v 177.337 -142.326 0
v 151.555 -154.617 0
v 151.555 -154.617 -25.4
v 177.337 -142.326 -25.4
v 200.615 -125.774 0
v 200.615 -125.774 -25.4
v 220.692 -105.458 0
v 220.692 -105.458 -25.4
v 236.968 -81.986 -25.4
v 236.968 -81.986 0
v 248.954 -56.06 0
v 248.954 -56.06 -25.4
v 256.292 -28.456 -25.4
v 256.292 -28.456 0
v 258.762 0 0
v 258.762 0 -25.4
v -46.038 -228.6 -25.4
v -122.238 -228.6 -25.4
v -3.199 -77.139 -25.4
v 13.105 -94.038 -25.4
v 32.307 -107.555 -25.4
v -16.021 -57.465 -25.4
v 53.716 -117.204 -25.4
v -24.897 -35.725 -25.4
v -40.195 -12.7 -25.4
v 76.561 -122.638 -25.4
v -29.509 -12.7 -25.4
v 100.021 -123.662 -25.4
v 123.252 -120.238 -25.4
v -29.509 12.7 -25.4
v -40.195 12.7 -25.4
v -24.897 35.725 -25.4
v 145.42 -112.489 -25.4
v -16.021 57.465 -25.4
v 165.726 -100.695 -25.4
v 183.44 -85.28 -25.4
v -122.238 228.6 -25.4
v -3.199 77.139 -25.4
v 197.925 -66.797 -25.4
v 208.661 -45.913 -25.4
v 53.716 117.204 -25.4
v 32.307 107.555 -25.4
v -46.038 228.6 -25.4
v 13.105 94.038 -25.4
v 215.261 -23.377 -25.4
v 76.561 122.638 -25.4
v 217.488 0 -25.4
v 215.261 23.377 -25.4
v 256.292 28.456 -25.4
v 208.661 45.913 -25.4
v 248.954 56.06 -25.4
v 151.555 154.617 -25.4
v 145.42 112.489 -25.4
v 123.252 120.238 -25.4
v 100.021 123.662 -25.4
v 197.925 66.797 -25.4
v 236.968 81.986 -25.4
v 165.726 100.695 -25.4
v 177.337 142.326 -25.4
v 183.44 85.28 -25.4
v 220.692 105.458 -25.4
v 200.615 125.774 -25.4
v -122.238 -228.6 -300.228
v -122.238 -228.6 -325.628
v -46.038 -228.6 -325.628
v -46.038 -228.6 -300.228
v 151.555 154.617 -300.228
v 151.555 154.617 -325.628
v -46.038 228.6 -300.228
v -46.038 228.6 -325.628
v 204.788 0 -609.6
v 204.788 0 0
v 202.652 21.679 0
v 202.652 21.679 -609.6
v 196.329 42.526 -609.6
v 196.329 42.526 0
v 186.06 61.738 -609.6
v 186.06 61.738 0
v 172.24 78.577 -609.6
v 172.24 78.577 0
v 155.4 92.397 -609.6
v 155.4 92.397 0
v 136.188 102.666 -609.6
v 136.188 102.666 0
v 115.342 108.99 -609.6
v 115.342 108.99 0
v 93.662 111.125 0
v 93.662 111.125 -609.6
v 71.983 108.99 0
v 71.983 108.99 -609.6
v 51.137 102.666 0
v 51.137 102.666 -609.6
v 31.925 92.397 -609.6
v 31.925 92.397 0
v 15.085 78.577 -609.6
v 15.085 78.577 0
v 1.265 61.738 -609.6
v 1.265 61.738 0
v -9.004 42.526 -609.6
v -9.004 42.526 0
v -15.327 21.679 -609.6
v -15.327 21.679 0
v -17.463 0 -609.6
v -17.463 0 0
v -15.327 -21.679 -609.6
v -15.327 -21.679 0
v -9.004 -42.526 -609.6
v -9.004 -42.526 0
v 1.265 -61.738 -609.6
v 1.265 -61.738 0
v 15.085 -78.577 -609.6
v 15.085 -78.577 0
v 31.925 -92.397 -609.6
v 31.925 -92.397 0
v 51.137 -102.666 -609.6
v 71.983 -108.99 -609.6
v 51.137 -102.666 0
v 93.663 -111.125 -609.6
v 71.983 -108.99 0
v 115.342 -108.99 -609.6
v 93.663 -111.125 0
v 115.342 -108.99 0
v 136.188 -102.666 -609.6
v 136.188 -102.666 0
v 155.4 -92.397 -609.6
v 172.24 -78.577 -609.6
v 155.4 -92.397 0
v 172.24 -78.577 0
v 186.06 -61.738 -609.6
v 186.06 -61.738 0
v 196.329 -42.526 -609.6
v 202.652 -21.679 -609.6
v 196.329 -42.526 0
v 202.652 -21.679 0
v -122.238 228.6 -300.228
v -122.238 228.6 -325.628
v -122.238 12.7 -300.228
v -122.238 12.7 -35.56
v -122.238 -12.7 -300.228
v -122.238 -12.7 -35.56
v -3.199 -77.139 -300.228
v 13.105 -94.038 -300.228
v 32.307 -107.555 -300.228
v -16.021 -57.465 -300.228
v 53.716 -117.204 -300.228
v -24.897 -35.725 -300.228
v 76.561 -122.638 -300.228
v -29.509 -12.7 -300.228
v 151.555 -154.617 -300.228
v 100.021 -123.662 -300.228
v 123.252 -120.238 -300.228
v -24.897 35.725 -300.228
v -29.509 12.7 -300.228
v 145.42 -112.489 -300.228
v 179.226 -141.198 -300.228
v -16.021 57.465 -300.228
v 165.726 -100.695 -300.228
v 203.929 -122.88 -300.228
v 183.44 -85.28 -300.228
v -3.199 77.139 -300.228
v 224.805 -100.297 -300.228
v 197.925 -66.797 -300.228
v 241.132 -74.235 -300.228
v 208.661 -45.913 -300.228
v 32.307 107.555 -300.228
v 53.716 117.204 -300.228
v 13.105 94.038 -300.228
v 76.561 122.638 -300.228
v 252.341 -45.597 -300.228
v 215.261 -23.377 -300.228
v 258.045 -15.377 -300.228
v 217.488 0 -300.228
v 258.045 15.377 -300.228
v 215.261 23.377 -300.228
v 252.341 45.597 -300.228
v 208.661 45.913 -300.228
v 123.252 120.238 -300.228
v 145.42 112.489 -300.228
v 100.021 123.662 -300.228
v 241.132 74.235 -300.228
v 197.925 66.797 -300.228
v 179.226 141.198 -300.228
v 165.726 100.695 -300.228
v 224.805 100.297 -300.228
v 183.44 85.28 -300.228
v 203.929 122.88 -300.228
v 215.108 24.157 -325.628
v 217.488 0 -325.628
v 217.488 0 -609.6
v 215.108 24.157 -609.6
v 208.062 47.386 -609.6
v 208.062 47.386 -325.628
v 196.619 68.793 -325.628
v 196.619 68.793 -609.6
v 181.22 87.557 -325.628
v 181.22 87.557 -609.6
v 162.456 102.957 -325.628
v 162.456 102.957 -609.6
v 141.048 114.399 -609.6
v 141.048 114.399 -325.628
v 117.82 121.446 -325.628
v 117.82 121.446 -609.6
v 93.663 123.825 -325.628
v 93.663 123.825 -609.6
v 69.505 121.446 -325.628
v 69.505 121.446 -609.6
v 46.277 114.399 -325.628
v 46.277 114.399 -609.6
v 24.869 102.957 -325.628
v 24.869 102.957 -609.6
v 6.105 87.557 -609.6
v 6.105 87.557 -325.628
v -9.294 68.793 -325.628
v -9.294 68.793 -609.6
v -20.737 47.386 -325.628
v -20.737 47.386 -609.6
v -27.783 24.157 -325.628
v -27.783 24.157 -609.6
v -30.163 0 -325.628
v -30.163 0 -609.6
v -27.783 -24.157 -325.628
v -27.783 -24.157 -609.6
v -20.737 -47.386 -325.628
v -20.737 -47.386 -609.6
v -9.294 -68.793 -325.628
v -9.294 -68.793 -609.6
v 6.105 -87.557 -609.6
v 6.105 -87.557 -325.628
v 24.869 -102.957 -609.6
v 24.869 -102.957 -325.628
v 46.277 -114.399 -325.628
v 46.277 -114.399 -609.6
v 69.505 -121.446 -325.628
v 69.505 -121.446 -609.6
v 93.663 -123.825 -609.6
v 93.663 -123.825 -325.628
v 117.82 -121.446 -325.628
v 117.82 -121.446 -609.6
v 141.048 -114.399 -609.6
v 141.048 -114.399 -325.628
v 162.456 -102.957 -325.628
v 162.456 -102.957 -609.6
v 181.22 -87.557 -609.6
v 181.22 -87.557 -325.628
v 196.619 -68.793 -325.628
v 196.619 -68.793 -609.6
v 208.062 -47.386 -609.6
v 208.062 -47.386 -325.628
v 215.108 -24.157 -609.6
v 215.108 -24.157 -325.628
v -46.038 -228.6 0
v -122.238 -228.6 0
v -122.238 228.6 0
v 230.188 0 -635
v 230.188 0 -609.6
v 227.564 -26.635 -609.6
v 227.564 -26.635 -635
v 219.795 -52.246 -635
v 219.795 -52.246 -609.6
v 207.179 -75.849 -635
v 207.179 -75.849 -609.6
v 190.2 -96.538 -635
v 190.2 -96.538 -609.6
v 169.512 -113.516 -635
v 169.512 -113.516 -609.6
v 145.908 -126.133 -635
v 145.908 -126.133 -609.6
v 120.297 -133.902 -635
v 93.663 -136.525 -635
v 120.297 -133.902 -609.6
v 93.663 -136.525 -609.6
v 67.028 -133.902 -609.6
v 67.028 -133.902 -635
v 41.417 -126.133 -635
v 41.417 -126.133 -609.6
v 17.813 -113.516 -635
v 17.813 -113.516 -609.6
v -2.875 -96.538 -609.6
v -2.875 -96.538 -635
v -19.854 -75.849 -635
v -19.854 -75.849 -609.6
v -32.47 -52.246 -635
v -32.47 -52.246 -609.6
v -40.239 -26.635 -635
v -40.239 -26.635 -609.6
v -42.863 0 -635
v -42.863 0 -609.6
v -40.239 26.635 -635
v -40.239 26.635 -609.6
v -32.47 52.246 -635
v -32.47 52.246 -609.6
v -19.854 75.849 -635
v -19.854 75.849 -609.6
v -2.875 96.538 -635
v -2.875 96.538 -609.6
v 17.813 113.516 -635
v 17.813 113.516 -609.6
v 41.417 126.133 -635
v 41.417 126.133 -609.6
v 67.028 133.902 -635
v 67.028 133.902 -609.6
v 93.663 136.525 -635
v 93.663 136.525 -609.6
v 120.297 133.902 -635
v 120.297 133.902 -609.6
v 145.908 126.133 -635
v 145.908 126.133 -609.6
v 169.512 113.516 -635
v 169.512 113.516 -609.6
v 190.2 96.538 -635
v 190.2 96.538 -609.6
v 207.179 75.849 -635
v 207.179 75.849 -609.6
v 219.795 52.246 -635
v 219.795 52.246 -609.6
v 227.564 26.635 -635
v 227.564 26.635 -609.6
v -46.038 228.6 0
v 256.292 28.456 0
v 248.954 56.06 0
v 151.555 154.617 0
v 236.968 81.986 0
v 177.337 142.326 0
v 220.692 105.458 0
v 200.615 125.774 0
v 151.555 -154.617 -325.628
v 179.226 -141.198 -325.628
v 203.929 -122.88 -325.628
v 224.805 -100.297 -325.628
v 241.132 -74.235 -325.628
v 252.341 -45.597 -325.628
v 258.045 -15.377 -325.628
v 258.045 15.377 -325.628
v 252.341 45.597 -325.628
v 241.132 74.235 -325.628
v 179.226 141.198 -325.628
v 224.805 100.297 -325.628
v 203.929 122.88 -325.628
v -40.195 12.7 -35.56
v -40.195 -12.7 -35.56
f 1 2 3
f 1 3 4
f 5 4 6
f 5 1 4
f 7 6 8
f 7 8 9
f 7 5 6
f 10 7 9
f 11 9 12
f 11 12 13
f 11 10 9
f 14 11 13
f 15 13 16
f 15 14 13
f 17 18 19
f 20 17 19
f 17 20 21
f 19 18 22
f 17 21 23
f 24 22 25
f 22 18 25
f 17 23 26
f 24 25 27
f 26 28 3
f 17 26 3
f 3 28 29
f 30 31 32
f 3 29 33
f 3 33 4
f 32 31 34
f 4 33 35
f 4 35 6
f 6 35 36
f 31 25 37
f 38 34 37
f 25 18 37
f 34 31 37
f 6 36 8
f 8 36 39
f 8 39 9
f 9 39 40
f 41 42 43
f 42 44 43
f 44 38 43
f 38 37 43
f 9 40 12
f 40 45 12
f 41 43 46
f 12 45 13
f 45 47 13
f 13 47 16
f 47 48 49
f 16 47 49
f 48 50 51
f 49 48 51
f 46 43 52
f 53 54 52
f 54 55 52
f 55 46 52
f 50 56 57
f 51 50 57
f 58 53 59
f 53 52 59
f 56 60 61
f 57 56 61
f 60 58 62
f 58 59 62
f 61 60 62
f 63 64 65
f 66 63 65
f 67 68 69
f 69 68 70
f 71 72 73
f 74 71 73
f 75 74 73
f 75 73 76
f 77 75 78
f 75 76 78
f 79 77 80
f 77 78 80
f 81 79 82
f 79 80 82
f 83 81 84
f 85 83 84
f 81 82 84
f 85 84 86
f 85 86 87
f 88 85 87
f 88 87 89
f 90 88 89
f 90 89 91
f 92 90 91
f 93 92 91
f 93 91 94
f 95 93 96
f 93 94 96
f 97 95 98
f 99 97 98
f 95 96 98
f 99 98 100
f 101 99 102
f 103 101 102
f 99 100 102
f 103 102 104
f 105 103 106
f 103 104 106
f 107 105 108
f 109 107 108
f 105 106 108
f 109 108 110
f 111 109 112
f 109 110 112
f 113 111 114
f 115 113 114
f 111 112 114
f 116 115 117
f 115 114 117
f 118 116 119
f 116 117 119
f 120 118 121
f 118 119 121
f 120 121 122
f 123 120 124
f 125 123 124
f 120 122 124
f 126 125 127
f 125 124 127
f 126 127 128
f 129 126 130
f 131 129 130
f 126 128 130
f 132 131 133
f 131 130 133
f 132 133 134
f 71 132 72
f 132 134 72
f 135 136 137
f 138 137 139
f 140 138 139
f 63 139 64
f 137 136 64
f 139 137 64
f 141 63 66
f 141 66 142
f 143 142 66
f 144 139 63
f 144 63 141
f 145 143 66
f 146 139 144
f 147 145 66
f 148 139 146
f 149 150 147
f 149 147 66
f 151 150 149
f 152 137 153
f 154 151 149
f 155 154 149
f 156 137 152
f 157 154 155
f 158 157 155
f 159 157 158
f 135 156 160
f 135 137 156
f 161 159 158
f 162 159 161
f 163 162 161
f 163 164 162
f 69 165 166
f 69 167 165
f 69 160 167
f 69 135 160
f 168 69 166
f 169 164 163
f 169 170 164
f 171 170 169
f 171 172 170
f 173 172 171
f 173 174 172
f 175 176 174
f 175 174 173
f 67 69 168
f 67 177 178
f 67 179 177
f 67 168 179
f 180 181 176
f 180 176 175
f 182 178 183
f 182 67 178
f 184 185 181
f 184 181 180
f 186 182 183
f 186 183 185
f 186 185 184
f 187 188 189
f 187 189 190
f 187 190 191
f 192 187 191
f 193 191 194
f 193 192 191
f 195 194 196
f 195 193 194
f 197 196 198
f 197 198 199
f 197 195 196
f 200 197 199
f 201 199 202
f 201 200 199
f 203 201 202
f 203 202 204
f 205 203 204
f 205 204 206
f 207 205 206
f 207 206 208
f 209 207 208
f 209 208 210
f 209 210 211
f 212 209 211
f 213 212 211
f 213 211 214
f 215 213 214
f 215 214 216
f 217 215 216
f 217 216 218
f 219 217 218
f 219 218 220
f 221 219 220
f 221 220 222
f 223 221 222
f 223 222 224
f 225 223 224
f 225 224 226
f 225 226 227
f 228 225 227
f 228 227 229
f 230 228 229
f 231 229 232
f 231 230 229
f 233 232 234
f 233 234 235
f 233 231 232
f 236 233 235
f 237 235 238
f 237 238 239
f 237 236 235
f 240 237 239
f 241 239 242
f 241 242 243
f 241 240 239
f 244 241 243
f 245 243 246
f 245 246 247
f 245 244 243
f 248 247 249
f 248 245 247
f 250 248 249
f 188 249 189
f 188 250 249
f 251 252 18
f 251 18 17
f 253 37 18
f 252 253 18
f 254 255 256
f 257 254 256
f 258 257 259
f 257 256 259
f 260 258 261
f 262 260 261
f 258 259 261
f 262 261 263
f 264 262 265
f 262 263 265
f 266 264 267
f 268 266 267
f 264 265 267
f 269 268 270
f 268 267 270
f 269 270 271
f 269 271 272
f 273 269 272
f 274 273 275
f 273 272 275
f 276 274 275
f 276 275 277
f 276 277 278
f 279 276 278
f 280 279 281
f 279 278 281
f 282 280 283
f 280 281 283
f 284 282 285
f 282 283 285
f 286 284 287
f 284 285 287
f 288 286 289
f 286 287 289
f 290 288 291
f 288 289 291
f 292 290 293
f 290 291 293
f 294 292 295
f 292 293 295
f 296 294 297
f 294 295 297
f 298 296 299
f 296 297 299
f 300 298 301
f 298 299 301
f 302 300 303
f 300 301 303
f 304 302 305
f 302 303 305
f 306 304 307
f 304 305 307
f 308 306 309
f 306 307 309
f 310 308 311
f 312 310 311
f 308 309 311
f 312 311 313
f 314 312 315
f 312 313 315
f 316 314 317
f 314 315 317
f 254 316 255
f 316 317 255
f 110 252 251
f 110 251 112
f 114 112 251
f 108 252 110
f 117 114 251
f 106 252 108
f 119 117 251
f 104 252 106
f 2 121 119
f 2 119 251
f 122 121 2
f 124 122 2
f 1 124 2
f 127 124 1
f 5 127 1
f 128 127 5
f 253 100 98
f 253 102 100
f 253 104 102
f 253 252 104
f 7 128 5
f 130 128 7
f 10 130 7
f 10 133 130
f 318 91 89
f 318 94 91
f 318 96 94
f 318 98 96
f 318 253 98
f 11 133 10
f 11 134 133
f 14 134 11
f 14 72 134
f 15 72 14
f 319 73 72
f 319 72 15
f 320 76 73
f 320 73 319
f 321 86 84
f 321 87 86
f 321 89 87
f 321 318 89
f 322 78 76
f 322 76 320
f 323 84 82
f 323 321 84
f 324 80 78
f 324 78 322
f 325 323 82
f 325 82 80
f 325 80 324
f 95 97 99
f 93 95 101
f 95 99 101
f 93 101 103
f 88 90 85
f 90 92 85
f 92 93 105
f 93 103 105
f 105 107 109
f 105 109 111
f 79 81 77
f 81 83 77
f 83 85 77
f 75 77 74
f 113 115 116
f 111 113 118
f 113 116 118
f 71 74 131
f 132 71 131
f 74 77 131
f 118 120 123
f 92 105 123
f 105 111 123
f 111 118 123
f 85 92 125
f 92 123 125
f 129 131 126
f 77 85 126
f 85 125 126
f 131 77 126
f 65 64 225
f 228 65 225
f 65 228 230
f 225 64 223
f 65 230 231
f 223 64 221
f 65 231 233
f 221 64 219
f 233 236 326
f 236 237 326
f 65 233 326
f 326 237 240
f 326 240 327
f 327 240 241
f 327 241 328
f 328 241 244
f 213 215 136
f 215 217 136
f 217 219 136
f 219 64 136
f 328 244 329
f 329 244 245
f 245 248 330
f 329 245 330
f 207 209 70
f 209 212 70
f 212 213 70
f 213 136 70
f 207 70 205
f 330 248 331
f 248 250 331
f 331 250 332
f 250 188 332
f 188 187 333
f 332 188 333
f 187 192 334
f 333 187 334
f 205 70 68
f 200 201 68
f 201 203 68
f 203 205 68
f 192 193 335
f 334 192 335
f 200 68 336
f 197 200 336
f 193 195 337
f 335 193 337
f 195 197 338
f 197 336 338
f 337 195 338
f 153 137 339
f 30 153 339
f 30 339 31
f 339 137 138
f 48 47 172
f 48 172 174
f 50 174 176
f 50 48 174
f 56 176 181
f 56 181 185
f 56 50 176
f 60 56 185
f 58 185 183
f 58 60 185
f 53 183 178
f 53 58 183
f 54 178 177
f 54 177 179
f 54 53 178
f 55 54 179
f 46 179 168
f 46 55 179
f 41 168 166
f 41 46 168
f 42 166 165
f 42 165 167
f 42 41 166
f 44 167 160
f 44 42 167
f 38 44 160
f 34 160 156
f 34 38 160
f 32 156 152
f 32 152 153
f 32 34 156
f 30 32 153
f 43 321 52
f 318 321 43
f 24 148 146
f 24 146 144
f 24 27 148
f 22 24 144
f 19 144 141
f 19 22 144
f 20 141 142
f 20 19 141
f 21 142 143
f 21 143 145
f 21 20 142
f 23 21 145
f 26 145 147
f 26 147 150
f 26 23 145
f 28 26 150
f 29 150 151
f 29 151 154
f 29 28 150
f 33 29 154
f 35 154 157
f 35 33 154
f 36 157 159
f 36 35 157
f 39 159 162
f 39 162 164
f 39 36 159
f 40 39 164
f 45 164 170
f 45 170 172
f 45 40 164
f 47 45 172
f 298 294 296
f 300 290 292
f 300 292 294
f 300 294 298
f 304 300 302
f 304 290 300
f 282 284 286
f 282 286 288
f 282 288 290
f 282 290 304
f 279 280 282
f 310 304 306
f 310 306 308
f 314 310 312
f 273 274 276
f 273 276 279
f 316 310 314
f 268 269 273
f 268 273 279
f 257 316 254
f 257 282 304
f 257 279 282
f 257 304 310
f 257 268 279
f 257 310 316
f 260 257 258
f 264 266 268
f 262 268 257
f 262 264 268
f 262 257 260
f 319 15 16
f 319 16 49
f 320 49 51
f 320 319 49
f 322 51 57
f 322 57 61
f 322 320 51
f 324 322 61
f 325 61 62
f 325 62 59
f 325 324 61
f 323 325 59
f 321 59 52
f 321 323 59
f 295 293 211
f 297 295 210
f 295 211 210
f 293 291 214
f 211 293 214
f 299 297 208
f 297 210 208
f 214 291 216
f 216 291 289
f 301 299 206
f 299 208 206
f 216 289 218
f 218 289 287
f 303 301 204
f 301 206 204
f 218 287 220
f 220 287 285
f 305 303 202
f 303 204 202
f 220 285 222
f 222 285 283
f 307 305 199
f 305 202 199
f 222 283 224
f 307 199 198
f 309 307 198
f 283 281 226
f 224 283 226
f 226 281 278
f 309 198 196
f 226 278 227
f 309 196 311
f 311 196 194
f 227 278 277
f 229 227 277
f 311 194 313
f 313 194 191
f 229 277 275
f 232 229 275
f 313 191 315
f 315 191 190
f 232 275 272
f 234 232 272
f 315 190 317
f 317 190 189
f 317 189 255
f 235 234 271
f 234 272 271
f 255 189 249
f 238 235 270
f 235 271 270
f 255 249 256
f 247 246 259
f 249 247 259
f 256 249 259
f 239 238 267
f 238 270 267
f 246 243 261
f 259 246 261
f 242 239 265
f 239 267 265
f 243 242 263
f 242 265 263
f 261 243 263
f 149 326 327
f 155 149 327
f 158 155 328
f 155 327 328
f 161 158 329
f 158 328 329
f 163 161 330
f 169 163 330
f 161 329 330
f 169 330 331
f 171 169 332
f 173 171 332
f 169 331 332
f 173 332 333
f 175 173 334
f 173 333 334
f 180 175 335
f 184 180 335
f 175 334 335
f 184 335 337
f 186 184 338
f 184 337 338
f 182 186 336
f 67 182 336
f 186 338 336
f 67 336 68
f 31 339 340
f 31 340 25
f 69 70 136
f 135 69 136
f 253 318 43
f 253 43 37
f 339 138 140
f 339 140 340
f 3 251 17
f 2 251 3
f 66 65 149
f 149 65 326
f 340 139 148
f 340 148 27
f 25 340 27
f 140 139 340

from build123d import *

# Parameters (mm, degrees)
F0_R           = 123.825
F1_DEPTH       = 25.4
F3_R           = 123.825
F4_DEPTH       = 25.4
F5_R           = 123.825
F5_R_2         = 111.125
F6_DEPTH       = 609.6
F7_R           = 136.525
F8_DEPTH       = 25.4
F9_W           = 25.4
F9_H           = 274.828
F11_W          = 82.042
F11_H          = 10.16
F12_DEPTH      = 228.601
F12_DEPTH_BACK = 228.601


with BuildPart() as f1:
    # F0 (on Top) → F1 (new body)
    with BuildSketch(Plane.XY):
        with BuildLine():
            ThreePointArc((151.5545215542, -154.6173465054), (229.3385530798, -94.074537579), (258.7625, 0))
            ThreePointArc((258.7625, 0), (229.3385530798, 94.074537579), (151.5545215542, 154.6173465054))
            Line((151.5545215542, 154.6173465054), (-46.0375, 228.6))
            Line((-46.0375, 228.6), (-122.2375, 228.6))
            Line((-122.2375, 228.6), (-122.2375, 0))
            Line((-122.2375, 0), (-122.2375, -228.6))
            Line((-122.2375, -228.6), (-46.0375, -228.6))
            Line((-46.0375, -228.6), (151.5545215542, -154.6173465054))
        make_face()
        with Locations((93.6625, 0)):
            Circle(F0_R, mode=Mode.SUBTRACT)
    extrude(amount=-F1_DEPTH)



with BuildPart() as f4:
    # F3 (on offset) → F4 (new body)
    with BuildSketch(Plane.XY.offset(-325.628)):
        with BuildLine():
            Line((-46.0375, -228.6), (151.5545215542, -154.6173465054))
            ThreePointArc((151.5545215542, -154.6173465054), (258.7625, 0), (151.5545215542, 154.6173465054))
            Line((151.5545215542, 154.6173465054), (-46.0375, 228.6))
            Line((-46.0375, 228.6), (-122.2375, 228.6))
            Line((-122.2375, 228.6), (-122.2375, -228.6))
            Line((-122.2375, -228.6), (-46.0375, -228.6))
        make_face()
        with Locations((93.6625, 0)):
            Circle(F3_R, mode=Mode.SUBTRACT)
    extrude(amount=F4_DEPTH)


with BuildPart() as f1_1:
    add(f1.part)

    add(f4.part)  # F6 merges F4
    # F5 (on face) → F6 (join)
    with BuildSketch(Plane.XY):
        with Locations((93.6625, 0)):
            Circle(F5_R)
        with Locations((93.6625, 0)):
            Circle(F5_R_2, mode=Mode.SUBTRACT)
    extrude(amount=-F6_DEPTH)

    # F7 (on face) → F8 (join)
    with BuildSketch(Plane(origin=(0, 0, -609.6), x_dir=(1, 0, 0), z_dir=(0, 0, -1))):
        with Locations((93.6625, 0)):
            Circle(F7_R)
    extrude(amount=F8_DEPTH)

    # F9 (on face) → F10 (join, up to the next surface of F1)
    with BuildSketch(Plane(origin=(-122.2375, 0, 0), x_dir=(0, -1, 0), z_dir=(-1, 0, 0))):
        with Locations((0, -162.814)):
            Rectangle(F9_W, F9_H)
    extrude(until=Until.NEXT, dir=(1, 0, 0))

    # F11 (on Front) → F12 (cut, two sides)
    with BuildSketch(Plane.XZ) as f12_sk:
        with Locations((-81.2165, -30.48)):
            Rectangle(F11_W, F11_H)
    extrude(amount=-F12_DEPTH, mode=Mode.SUBTRACT)
    extrude(f12_sk.sketch, amount=F12_DEPTH_BACK, mode=Mode.SUBTRACT)


solid = f1_1.part
